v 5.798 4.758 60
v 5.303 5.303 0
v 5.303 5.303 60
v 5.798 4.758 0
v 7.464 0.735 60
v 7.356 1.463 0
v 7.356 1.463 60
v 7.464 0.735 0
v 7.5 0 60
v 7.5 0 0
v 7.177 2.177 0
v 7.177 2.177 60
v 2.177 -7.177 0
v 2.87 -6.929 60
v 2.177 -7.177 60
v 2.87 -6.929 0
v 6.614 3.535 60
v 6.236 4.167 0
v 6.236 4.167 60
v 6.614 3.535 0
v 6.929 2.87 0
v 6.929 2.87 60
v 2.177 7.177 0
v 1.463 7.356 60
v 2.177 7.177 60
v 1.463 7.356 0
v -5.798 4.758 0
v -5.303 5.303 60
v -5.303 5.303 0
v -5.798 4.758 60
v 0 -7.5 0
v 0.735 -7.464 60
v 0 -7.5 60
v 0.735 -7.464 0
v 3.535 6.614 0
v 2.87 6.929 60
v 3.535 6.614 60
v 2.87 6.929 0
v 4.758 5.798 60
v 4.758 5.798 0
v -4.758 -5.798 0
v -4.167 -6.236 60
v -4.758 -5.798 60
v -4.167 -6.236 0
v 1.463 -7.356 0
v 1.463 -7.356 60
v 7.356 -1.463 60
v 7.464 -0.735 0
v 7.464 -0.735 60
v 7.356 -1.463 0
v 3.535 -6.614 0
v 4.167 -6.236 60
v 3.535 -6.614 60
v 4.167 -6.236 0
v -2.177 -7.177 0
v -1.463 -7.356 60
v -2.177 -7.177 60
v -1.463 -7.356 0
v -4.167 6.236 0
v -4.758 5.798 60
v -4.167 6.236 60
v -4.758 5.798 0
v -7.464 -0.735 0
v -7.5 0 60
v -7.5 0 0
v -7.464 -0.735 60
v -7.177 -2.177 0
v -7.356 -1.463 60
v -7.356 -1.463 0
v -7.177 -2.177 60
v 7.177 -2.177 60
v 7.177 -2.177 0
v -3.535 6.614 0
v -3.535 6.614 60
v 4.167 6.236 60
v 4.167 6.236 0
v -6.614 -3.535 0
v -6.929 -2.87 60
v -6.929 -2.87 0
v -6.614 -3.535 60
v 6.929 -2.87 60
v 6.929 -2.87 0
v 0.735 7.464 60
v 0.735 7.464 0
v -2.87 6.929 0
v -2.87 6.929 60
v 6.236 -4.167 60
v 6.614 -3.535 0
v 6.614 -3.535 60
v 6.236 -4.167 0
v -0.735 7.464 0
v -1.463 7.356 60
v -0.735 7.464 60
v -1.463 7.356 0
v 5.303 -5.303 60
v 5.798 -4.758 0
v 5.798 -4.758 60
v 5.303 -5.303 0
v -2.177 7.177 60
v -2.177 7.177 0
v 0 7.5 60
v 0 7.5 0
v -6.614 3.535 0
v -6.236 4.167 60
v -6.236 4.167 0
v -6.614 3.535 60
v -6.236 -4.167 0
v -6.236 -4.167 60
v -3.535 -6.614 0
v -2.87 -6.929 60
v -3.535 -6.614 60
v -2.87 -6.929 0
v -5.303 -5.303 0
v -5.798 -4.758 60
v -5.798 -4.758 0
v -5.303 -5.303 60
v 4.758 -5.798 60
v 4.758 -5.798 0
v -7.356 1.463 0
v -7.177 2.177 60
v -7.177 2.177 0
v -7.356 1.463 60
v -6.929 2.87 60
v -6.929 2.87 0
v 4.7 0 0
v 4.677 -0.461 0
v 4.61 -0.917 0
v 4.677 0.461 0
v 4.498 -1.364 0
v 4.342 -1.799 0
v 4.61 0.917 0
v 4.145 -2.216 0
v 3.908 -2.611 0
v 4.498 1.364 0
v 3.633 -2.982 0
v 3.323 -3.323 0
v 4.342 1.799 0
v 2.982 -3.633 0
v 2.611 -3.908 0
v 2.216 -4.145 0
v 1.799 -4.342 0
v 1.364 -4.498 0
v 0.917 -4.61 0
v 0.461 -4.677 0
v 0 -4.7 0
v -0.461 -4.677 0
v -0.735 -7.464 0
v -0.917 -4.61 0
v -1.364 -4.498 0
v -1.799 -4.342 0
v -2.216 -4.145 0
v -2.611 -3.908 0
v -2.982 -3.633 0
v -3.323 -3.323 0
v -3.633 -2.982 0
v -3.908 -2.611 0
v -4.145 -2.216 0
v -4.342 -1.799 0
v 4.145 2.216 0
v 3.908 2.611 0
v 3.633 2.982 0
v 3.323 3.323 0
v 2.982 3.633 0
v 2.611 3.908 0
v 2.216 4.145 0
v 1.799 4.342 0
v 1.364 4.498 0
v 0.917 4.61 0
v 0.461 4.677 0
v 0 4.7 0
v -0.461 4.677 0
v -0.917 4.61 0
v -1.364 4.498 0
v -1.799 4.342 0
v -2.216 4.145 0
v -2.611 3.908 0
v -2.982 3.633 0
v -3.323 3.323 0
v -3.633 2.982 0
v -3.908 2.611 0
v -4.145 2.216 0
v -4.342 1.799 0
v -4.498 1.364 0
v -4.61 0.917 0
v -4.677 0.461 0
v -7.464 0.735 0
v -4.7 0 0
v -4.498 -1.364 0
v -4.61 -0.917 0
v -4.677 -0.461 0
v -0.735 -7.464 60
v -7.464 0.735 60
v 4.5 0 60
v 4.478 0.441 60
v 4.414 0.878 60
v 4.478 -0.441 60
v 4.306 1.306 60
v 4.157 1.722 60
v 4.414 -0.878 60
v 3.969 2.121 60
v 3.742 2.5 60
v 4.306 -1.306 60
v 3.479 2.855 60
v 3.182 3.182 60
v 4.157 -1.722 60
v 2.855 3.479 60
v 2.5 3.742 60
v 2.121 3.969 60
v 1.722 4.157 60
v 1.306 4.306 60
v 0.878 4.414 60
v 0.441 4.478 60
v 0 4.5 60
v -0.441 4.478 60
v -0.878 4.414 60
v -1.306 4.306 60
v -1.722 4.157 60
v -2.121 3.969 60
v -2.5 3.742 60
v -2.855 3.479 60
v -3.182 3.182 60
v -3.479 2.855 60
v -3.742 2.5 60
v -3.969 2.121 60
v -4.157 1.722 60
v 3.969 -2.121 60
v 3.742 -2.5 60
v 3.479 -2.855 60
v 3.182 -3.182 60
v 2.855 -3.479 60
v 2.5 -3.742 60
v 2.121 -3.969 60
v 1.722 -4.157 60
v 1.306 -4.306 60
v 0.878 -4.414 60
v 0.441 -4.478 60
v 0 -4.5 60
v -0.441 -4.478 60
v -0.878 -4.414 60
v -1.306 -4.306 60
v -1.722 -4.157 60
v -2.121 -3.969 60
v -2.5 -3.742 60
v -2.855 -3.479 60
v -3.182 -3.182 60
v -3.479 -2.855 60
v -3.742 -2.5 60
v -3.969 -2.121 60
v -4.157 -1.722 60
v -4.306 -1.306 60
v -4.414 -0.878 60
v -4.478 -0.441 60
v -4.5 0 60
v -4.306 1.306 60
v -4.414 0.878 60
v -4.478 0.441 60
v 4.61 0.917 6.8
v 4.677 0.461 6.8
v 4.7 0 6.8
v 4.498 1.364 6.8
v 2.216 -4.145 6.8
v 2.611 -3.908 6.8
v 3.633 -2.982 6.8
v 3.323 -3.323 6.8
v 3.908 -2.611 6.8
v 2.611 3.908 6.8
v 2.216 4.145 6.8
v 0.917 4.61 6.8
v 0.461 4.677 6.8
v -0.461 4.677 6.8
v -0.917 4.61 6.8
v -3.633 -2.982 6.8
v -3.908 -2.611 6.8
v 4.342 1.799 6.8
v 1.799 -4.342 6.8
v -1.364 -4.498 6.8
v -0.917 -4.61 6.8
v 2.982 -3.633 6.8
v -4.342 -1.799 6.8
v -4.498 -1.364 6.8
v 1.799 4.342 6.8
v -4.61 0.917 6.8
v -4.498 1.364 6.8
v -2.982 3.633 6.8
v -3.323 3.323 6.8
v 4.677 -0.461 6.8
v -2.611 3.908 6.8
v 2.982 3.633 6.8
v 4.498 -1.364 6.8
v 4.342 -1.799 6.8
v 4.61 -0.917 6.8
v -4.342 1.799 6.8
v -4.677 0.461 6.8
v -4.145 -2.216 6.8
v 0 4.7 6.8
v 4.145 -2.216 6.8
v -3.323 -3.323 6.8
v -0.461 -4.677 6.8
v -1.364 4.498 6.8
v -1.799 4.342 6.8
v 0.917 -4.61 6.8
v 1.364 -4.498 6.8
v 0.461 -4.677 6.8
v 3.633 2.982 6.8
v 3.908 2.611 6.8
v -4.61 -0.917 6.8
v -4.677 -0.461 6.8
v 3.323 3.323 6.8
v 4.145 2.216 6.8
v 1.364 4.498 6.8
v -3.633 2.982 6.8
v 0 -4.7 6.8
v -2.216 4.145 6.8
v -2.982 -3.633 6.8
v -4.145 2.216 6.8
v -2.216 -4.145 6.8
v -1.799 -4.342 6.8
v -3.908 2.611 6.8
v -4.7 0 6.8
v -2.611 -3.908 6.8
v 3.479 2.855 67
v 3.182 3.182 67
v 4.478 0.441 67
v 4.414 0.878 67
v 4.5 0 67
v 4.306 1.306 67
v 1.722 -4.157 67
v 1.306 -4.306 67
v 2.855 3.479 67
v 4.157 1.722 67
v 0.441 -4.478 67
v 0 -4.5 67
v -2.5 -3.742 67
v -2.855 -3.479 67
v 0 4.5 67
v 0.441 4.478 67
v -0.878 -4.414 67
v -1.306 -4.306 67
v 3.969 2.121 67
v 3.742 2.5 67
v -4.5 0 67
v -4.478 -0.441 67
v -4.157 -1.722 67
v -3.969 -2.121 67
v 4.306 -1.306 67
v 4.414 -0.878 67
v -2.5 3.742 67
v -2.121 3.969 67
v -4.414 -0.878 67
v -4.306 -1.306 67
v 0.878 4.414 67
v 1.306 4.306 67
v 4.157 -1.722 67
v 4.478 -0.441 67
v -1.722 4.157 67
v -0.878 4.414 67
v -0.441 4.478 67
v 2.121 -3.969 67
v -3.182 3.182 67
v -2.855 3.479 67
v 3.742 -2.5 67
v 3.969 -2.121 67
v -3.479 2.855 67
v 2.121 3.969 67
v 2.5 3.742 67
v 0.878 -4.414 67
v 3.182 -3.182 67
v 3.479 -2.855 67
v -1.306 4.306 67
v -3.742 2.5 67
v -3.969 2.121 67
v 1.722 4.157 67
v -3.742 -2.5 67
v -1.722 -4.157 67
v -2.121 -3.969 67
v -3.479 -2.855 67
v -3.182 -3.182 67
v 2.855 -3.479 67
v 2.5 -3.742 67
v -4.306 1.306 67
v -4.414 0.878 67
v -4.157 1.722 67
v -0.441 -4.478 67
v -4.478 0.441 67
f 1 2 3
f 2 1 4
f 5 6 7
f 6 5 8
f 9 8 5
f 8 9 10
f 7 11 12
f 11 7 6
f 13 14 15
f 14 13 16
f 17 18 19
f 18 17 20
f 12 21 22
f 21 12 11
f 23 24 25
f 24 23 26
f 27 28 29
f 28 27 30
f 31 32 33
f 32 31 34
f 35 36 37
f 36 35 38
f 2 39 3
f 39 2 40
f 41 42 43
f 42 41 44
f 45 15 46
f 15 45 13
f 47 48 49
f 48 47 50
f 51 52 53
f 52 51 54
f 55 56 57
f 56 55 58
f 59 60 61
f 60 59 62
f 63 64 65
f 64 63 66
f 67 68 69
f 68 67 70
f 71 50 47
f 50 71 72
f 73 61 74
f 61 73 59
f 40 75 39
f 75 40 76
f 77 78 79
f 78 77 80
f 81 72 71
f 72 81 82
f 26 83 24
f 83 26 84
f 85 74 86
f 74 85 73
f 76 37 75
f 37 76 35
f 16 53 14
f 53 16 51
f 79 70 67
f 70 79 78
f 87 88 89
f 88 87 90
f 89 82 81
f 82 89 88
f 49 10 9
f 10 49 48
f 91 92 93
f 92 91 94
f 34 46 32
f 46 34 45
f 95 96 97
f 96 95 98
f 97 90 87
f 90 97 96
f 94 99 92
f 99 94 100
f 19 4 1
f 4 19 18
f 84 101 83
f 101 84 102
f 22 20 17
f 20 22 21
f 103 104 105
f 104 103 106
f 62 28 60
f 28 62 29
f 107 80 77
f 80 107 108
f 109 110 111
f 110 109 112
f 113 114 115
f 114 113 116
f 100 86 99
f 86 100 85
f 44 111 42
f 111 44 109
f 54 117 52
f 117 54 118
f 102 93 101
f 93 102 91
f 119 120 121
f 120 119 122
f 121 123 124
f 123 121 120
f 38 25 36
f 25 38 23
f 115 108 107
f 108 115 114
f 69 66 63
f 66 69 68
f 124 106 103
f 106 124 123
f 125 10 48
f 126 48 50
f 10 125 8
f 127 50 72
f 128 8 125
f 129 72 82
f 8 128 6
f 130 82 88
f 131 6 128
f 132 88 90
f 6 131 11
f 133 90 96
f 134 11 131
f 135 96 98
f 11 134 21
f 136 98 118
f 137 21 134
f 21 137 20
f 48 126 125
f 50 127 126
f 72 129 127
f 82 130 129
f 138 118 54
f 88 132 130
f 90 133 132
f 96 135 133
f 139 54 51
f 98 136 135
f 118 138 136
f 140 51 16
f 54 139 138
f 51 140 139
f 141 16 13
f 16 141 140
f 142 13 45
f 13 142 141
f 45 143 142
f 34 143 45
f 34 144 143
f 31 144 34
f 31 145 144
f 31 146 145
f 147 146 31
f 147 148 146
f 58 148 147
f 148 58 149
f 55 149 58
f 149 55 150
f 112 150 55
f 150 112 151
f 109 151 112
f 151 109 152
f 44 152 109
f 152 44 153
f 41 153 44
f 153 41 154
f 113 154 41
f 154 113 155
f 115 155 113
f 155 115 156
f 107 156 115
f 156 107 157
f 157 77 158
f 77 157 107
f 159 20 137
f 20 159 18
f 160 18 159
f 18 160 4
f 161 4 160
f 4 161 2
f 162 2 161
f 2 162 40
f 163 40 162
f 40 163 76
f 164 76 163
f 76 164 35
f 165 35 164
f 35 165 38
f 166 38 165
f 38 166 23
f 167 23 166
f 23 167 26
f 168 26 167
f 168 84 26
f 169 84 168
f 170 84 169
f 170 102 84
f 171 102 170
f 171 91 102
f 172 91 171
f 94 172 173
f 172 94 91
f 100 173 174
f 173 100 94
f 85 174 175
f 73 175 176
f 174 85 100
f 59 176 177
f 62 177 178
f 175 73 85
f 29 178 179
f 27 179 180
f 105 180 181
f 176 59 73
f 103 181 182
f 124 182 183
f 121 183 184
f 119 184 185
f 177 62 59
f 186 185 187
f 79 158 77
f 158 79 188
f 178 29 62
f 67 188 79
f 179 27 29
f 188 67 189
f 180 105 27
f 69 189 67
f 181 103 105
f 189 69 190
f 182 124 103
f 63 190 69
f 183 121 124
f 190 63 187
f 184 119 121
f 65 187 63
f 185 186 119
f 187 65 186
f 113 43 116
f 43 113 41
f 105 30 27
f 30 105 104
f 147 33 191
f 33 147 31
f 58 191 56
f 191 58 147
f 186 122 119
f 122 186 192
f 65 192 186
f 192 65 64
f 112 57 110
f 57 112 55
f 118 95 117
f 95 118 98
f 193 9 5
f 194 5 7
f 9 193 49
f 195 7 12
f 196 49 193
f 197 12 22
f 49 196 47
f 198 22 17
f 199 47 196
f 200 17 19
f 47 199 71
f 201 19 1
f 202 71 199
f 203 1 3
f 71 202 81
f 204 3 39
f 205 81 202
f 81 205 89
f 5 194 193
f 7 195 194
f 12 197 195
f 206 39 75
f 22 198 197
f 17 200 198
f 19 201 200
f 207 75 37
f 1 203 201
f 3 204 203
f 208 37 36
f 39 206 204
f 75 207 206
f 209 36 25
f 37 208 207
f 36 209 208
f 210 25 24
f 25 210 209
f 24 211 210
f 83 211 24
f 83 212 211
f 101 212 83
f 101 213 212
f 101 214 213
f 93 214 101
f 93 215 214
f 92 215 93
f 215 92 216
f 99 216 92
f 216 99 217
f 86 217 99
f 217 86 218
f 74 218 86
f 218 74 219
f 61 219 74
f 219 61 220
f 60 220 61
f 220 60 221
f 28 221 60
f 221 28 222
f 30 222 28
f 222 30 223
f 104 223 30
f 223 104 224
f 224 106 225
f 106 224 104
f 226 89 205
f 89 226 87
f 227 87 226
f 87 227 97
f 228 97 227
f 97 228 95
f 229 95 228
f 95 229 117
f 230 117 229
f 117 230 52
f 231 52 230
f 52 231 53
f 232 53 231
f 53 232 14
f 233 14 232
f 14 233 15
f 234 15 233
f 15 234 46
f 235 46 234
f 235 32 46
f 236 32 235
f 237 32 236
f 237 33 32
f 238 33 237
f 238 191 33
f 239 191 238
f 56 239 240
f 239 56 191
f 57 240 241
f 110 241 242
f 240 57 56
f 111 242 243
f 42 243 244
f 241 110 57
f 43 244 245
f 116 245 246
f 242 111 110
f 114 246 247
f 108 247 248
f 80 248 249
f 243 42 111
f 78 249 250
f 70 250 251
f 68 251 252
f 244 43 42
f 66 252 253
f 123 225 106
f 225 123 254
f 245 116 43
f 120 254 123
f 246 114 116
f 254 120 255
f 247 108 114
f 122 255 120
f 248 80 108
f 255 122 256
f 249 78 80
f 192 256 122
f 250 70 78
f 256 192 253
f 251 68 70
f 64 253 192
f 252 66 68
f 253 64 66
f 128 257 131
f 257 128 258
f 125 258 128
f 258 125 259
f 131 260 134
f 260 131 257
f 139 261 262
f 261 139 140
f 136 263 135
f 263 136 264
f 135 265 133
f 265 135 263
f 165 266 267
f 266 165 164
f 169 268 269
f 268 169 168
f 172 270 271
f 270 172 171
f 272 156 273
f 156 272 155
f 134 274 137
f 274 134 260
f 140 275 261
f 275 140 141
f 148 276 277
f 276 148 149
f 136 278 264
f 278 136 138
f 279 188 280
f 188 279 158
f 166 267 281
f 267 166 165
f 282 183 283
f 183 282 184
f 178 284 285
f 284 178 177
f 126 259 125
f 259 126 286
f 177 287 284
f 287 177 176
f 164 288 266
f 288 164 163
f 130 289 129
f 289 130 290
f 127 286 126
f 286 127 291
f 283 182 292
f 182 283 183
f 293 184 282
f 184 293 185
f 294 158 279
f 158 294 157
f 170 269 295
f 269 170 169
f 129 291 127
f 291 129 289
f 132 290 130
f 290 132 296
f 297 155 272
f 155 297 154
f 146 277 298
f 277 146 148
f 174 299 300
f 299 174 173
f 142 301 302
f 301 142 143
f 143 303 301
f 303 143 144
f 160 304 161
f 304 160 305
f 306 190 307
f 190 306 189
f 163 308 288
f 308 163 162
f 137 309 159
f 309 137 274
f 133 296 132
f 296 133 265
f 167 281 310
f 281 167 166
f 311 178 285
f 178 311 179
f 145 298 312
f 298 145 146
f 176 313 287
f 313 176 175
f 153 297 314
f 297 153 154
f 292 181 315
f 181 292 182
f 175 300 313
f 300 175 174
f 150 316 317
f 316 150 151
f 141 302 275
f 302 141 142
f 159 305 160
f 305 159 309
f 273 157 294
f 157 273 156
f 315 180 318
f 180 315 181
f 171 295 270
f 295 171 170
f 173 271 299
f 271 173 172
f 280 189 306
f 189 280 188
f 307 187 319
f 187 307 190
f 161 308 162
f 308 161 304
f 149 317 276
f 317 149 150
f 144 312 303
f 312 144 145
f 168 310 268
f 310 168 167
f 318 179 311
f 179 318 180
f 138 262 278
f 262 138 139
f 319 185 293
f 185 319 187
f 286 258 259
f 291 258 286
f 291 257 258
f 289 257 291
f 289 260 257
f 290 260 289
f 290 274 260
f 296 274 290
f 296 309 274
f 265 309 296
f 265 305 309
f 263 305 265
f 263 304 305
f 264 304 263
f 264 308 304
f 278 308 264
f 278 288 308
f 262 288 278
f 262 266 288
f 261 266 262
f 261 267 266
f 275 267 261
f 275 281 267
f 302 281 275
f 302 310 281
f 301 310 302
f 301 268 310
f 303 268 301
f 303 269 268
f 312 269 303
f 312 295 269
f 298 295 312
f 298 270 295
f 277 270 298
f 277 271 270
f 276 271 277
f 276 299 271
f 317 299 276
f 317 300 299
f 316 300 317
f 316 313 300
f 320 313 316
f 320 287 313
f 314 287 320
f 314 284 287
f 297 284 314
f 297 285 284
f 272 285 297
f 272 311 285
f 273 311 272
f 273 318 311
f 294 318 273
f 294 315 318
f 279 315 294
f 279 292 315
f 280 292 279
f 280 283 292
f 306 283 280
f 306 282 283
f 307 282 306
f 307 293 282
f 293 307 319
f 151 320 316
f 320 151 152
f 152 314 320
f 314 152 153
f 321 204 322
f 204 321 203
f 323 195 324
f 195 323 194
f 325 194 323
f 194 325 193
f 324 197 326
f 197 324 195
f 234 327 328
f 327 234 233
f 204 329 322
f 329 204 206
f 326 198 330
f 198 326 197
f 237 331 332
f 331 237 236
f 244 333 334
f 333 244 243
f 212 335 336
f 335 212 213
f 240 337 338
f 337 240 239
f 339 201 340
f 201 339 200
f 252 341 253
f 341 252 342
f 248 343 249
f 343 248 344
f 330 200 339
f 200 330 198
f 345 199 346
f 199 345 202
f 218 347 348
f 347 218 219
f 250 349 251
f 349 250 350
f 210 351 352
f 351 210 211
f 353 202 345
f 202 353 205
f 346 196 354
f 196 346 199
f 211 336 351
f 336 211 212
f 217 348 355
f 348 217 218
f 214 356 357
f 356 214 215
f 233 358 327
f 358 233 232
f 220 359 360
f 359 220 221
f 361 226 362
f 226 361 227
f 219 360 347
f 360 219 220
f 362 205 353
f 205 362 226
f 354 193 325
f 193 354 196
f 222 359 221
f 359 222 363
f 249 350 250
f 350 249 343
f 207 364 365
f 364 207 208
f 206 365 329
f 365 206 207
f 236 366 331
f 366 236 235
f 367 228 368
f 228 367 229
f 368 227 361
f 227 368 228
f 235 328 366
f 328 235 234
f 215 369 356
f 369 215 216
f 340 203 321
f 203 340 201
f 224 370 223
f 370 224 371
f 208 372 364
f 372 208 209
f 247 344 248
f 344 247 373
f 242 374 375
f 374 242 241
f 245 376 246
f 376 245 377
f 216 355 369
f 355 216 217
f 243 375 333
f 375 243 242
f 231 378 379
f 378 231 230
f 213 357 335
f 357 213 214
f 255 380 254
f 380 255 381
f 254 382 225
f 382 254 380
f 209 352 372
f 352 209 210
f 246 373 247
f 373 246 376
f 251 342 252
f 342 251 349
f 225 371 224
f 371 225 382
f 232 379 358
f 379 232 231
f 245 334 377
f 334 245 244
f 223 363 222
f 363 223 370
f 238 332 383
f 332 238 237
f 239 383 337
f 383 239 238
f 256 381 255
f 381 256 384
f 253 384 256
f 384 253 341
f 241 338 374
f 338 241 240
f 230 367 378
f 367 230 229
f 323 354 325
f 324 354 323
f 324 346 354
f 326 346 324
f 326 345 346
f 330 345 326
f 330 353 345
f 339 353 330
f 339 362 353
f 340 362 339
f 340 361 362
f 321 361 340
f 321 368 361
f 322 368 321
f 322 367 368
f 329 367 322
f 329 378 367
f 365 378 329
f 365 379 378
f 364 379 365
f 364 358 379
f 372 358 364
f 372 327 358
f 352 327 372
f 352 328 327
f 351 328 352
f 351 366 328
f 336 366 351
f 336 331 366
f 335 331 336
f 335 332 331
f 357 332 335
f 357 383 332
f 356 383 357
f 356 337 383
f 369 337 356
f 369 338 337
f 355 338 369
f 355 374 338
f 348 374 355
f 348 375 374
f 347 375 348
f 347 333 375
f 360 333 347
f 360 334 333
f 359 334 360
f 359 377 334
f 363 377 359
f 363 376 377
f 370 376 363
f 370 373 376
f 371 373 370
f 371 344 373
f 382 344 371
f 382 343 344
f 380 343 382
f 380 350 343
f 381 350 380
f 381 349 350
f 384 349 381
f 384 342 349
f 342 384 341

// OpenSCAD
plate=false;
pole=true;
startplate=false;
$fn=64;

nupsi_diameter = 9;
nupsi_height = 7;

stand_diameter=15;
stand_height=60;
stand_center_offset=60;

plate_width=156;
plate_depth=66;
plate_height=2;
plate_radius=7.5;

gap = 0.2;

// pole
if (pole==true)
{
    translate([0,0,stand_height])
    cylinder(r=nupsi_diameter/2,nupsi_height);
    difference()
    {
        cylinder(r=stand_diameter/2,stand_height);
        translate([0,0,-gap])
        cylinder(r=nupsi_diameter/2 + gap,nupsi_height);
    }
}

if (plate==true)
{
    difference()
    {
        hull()
        {
            cylinder(r=plate_radius,plate_height);
            translate([plate_width,0,0])
            cylinder(r=plate_radius,plate_height);
            translate([plate_width,plate_depth,0])
            cylinder(r=plate_radius,plate_height);
            translate([0,plate_depth,0])
            cylinder(r=plate_radius,plate_height);
        }
        if (startplate==false)
        {
            translate([0,0,-gap])
            cylinder(r=nupsi_diameter/2 + gap,nupsi_height);
            translate([0,plate_depth,-gap])
            cylinder(r=nupsi_diameter/2 + gap,nupsi_height);
            translate([plate_width,plate_depth,-gap])
            cylinder(r=nupsi_diameter/2 + gap,nupsi_height);
            translate([plate_width, 0,-gap])
            cylinder(r=nupsi_diameter/2 + gap,nupsi_height);
        }
    }

    if (startplate==true)
    {
        translate([0,0,plate_height])
        cylinder(r=nupsi_diameter/2,nupsi_height);
        translate([0,plate_depth,plate_height])
        cylinder(r=nupsi_diameter/2,nupsi_height);
        translate([plate_width,plate_depth,plate_height])
        cylinder(r=nupsi_diameter/2,nupsi_height);
        translate([plate_width,0,plate_height])
        cylinder(r=nupsi_diameter/2,nupsi_height);
    }
}
